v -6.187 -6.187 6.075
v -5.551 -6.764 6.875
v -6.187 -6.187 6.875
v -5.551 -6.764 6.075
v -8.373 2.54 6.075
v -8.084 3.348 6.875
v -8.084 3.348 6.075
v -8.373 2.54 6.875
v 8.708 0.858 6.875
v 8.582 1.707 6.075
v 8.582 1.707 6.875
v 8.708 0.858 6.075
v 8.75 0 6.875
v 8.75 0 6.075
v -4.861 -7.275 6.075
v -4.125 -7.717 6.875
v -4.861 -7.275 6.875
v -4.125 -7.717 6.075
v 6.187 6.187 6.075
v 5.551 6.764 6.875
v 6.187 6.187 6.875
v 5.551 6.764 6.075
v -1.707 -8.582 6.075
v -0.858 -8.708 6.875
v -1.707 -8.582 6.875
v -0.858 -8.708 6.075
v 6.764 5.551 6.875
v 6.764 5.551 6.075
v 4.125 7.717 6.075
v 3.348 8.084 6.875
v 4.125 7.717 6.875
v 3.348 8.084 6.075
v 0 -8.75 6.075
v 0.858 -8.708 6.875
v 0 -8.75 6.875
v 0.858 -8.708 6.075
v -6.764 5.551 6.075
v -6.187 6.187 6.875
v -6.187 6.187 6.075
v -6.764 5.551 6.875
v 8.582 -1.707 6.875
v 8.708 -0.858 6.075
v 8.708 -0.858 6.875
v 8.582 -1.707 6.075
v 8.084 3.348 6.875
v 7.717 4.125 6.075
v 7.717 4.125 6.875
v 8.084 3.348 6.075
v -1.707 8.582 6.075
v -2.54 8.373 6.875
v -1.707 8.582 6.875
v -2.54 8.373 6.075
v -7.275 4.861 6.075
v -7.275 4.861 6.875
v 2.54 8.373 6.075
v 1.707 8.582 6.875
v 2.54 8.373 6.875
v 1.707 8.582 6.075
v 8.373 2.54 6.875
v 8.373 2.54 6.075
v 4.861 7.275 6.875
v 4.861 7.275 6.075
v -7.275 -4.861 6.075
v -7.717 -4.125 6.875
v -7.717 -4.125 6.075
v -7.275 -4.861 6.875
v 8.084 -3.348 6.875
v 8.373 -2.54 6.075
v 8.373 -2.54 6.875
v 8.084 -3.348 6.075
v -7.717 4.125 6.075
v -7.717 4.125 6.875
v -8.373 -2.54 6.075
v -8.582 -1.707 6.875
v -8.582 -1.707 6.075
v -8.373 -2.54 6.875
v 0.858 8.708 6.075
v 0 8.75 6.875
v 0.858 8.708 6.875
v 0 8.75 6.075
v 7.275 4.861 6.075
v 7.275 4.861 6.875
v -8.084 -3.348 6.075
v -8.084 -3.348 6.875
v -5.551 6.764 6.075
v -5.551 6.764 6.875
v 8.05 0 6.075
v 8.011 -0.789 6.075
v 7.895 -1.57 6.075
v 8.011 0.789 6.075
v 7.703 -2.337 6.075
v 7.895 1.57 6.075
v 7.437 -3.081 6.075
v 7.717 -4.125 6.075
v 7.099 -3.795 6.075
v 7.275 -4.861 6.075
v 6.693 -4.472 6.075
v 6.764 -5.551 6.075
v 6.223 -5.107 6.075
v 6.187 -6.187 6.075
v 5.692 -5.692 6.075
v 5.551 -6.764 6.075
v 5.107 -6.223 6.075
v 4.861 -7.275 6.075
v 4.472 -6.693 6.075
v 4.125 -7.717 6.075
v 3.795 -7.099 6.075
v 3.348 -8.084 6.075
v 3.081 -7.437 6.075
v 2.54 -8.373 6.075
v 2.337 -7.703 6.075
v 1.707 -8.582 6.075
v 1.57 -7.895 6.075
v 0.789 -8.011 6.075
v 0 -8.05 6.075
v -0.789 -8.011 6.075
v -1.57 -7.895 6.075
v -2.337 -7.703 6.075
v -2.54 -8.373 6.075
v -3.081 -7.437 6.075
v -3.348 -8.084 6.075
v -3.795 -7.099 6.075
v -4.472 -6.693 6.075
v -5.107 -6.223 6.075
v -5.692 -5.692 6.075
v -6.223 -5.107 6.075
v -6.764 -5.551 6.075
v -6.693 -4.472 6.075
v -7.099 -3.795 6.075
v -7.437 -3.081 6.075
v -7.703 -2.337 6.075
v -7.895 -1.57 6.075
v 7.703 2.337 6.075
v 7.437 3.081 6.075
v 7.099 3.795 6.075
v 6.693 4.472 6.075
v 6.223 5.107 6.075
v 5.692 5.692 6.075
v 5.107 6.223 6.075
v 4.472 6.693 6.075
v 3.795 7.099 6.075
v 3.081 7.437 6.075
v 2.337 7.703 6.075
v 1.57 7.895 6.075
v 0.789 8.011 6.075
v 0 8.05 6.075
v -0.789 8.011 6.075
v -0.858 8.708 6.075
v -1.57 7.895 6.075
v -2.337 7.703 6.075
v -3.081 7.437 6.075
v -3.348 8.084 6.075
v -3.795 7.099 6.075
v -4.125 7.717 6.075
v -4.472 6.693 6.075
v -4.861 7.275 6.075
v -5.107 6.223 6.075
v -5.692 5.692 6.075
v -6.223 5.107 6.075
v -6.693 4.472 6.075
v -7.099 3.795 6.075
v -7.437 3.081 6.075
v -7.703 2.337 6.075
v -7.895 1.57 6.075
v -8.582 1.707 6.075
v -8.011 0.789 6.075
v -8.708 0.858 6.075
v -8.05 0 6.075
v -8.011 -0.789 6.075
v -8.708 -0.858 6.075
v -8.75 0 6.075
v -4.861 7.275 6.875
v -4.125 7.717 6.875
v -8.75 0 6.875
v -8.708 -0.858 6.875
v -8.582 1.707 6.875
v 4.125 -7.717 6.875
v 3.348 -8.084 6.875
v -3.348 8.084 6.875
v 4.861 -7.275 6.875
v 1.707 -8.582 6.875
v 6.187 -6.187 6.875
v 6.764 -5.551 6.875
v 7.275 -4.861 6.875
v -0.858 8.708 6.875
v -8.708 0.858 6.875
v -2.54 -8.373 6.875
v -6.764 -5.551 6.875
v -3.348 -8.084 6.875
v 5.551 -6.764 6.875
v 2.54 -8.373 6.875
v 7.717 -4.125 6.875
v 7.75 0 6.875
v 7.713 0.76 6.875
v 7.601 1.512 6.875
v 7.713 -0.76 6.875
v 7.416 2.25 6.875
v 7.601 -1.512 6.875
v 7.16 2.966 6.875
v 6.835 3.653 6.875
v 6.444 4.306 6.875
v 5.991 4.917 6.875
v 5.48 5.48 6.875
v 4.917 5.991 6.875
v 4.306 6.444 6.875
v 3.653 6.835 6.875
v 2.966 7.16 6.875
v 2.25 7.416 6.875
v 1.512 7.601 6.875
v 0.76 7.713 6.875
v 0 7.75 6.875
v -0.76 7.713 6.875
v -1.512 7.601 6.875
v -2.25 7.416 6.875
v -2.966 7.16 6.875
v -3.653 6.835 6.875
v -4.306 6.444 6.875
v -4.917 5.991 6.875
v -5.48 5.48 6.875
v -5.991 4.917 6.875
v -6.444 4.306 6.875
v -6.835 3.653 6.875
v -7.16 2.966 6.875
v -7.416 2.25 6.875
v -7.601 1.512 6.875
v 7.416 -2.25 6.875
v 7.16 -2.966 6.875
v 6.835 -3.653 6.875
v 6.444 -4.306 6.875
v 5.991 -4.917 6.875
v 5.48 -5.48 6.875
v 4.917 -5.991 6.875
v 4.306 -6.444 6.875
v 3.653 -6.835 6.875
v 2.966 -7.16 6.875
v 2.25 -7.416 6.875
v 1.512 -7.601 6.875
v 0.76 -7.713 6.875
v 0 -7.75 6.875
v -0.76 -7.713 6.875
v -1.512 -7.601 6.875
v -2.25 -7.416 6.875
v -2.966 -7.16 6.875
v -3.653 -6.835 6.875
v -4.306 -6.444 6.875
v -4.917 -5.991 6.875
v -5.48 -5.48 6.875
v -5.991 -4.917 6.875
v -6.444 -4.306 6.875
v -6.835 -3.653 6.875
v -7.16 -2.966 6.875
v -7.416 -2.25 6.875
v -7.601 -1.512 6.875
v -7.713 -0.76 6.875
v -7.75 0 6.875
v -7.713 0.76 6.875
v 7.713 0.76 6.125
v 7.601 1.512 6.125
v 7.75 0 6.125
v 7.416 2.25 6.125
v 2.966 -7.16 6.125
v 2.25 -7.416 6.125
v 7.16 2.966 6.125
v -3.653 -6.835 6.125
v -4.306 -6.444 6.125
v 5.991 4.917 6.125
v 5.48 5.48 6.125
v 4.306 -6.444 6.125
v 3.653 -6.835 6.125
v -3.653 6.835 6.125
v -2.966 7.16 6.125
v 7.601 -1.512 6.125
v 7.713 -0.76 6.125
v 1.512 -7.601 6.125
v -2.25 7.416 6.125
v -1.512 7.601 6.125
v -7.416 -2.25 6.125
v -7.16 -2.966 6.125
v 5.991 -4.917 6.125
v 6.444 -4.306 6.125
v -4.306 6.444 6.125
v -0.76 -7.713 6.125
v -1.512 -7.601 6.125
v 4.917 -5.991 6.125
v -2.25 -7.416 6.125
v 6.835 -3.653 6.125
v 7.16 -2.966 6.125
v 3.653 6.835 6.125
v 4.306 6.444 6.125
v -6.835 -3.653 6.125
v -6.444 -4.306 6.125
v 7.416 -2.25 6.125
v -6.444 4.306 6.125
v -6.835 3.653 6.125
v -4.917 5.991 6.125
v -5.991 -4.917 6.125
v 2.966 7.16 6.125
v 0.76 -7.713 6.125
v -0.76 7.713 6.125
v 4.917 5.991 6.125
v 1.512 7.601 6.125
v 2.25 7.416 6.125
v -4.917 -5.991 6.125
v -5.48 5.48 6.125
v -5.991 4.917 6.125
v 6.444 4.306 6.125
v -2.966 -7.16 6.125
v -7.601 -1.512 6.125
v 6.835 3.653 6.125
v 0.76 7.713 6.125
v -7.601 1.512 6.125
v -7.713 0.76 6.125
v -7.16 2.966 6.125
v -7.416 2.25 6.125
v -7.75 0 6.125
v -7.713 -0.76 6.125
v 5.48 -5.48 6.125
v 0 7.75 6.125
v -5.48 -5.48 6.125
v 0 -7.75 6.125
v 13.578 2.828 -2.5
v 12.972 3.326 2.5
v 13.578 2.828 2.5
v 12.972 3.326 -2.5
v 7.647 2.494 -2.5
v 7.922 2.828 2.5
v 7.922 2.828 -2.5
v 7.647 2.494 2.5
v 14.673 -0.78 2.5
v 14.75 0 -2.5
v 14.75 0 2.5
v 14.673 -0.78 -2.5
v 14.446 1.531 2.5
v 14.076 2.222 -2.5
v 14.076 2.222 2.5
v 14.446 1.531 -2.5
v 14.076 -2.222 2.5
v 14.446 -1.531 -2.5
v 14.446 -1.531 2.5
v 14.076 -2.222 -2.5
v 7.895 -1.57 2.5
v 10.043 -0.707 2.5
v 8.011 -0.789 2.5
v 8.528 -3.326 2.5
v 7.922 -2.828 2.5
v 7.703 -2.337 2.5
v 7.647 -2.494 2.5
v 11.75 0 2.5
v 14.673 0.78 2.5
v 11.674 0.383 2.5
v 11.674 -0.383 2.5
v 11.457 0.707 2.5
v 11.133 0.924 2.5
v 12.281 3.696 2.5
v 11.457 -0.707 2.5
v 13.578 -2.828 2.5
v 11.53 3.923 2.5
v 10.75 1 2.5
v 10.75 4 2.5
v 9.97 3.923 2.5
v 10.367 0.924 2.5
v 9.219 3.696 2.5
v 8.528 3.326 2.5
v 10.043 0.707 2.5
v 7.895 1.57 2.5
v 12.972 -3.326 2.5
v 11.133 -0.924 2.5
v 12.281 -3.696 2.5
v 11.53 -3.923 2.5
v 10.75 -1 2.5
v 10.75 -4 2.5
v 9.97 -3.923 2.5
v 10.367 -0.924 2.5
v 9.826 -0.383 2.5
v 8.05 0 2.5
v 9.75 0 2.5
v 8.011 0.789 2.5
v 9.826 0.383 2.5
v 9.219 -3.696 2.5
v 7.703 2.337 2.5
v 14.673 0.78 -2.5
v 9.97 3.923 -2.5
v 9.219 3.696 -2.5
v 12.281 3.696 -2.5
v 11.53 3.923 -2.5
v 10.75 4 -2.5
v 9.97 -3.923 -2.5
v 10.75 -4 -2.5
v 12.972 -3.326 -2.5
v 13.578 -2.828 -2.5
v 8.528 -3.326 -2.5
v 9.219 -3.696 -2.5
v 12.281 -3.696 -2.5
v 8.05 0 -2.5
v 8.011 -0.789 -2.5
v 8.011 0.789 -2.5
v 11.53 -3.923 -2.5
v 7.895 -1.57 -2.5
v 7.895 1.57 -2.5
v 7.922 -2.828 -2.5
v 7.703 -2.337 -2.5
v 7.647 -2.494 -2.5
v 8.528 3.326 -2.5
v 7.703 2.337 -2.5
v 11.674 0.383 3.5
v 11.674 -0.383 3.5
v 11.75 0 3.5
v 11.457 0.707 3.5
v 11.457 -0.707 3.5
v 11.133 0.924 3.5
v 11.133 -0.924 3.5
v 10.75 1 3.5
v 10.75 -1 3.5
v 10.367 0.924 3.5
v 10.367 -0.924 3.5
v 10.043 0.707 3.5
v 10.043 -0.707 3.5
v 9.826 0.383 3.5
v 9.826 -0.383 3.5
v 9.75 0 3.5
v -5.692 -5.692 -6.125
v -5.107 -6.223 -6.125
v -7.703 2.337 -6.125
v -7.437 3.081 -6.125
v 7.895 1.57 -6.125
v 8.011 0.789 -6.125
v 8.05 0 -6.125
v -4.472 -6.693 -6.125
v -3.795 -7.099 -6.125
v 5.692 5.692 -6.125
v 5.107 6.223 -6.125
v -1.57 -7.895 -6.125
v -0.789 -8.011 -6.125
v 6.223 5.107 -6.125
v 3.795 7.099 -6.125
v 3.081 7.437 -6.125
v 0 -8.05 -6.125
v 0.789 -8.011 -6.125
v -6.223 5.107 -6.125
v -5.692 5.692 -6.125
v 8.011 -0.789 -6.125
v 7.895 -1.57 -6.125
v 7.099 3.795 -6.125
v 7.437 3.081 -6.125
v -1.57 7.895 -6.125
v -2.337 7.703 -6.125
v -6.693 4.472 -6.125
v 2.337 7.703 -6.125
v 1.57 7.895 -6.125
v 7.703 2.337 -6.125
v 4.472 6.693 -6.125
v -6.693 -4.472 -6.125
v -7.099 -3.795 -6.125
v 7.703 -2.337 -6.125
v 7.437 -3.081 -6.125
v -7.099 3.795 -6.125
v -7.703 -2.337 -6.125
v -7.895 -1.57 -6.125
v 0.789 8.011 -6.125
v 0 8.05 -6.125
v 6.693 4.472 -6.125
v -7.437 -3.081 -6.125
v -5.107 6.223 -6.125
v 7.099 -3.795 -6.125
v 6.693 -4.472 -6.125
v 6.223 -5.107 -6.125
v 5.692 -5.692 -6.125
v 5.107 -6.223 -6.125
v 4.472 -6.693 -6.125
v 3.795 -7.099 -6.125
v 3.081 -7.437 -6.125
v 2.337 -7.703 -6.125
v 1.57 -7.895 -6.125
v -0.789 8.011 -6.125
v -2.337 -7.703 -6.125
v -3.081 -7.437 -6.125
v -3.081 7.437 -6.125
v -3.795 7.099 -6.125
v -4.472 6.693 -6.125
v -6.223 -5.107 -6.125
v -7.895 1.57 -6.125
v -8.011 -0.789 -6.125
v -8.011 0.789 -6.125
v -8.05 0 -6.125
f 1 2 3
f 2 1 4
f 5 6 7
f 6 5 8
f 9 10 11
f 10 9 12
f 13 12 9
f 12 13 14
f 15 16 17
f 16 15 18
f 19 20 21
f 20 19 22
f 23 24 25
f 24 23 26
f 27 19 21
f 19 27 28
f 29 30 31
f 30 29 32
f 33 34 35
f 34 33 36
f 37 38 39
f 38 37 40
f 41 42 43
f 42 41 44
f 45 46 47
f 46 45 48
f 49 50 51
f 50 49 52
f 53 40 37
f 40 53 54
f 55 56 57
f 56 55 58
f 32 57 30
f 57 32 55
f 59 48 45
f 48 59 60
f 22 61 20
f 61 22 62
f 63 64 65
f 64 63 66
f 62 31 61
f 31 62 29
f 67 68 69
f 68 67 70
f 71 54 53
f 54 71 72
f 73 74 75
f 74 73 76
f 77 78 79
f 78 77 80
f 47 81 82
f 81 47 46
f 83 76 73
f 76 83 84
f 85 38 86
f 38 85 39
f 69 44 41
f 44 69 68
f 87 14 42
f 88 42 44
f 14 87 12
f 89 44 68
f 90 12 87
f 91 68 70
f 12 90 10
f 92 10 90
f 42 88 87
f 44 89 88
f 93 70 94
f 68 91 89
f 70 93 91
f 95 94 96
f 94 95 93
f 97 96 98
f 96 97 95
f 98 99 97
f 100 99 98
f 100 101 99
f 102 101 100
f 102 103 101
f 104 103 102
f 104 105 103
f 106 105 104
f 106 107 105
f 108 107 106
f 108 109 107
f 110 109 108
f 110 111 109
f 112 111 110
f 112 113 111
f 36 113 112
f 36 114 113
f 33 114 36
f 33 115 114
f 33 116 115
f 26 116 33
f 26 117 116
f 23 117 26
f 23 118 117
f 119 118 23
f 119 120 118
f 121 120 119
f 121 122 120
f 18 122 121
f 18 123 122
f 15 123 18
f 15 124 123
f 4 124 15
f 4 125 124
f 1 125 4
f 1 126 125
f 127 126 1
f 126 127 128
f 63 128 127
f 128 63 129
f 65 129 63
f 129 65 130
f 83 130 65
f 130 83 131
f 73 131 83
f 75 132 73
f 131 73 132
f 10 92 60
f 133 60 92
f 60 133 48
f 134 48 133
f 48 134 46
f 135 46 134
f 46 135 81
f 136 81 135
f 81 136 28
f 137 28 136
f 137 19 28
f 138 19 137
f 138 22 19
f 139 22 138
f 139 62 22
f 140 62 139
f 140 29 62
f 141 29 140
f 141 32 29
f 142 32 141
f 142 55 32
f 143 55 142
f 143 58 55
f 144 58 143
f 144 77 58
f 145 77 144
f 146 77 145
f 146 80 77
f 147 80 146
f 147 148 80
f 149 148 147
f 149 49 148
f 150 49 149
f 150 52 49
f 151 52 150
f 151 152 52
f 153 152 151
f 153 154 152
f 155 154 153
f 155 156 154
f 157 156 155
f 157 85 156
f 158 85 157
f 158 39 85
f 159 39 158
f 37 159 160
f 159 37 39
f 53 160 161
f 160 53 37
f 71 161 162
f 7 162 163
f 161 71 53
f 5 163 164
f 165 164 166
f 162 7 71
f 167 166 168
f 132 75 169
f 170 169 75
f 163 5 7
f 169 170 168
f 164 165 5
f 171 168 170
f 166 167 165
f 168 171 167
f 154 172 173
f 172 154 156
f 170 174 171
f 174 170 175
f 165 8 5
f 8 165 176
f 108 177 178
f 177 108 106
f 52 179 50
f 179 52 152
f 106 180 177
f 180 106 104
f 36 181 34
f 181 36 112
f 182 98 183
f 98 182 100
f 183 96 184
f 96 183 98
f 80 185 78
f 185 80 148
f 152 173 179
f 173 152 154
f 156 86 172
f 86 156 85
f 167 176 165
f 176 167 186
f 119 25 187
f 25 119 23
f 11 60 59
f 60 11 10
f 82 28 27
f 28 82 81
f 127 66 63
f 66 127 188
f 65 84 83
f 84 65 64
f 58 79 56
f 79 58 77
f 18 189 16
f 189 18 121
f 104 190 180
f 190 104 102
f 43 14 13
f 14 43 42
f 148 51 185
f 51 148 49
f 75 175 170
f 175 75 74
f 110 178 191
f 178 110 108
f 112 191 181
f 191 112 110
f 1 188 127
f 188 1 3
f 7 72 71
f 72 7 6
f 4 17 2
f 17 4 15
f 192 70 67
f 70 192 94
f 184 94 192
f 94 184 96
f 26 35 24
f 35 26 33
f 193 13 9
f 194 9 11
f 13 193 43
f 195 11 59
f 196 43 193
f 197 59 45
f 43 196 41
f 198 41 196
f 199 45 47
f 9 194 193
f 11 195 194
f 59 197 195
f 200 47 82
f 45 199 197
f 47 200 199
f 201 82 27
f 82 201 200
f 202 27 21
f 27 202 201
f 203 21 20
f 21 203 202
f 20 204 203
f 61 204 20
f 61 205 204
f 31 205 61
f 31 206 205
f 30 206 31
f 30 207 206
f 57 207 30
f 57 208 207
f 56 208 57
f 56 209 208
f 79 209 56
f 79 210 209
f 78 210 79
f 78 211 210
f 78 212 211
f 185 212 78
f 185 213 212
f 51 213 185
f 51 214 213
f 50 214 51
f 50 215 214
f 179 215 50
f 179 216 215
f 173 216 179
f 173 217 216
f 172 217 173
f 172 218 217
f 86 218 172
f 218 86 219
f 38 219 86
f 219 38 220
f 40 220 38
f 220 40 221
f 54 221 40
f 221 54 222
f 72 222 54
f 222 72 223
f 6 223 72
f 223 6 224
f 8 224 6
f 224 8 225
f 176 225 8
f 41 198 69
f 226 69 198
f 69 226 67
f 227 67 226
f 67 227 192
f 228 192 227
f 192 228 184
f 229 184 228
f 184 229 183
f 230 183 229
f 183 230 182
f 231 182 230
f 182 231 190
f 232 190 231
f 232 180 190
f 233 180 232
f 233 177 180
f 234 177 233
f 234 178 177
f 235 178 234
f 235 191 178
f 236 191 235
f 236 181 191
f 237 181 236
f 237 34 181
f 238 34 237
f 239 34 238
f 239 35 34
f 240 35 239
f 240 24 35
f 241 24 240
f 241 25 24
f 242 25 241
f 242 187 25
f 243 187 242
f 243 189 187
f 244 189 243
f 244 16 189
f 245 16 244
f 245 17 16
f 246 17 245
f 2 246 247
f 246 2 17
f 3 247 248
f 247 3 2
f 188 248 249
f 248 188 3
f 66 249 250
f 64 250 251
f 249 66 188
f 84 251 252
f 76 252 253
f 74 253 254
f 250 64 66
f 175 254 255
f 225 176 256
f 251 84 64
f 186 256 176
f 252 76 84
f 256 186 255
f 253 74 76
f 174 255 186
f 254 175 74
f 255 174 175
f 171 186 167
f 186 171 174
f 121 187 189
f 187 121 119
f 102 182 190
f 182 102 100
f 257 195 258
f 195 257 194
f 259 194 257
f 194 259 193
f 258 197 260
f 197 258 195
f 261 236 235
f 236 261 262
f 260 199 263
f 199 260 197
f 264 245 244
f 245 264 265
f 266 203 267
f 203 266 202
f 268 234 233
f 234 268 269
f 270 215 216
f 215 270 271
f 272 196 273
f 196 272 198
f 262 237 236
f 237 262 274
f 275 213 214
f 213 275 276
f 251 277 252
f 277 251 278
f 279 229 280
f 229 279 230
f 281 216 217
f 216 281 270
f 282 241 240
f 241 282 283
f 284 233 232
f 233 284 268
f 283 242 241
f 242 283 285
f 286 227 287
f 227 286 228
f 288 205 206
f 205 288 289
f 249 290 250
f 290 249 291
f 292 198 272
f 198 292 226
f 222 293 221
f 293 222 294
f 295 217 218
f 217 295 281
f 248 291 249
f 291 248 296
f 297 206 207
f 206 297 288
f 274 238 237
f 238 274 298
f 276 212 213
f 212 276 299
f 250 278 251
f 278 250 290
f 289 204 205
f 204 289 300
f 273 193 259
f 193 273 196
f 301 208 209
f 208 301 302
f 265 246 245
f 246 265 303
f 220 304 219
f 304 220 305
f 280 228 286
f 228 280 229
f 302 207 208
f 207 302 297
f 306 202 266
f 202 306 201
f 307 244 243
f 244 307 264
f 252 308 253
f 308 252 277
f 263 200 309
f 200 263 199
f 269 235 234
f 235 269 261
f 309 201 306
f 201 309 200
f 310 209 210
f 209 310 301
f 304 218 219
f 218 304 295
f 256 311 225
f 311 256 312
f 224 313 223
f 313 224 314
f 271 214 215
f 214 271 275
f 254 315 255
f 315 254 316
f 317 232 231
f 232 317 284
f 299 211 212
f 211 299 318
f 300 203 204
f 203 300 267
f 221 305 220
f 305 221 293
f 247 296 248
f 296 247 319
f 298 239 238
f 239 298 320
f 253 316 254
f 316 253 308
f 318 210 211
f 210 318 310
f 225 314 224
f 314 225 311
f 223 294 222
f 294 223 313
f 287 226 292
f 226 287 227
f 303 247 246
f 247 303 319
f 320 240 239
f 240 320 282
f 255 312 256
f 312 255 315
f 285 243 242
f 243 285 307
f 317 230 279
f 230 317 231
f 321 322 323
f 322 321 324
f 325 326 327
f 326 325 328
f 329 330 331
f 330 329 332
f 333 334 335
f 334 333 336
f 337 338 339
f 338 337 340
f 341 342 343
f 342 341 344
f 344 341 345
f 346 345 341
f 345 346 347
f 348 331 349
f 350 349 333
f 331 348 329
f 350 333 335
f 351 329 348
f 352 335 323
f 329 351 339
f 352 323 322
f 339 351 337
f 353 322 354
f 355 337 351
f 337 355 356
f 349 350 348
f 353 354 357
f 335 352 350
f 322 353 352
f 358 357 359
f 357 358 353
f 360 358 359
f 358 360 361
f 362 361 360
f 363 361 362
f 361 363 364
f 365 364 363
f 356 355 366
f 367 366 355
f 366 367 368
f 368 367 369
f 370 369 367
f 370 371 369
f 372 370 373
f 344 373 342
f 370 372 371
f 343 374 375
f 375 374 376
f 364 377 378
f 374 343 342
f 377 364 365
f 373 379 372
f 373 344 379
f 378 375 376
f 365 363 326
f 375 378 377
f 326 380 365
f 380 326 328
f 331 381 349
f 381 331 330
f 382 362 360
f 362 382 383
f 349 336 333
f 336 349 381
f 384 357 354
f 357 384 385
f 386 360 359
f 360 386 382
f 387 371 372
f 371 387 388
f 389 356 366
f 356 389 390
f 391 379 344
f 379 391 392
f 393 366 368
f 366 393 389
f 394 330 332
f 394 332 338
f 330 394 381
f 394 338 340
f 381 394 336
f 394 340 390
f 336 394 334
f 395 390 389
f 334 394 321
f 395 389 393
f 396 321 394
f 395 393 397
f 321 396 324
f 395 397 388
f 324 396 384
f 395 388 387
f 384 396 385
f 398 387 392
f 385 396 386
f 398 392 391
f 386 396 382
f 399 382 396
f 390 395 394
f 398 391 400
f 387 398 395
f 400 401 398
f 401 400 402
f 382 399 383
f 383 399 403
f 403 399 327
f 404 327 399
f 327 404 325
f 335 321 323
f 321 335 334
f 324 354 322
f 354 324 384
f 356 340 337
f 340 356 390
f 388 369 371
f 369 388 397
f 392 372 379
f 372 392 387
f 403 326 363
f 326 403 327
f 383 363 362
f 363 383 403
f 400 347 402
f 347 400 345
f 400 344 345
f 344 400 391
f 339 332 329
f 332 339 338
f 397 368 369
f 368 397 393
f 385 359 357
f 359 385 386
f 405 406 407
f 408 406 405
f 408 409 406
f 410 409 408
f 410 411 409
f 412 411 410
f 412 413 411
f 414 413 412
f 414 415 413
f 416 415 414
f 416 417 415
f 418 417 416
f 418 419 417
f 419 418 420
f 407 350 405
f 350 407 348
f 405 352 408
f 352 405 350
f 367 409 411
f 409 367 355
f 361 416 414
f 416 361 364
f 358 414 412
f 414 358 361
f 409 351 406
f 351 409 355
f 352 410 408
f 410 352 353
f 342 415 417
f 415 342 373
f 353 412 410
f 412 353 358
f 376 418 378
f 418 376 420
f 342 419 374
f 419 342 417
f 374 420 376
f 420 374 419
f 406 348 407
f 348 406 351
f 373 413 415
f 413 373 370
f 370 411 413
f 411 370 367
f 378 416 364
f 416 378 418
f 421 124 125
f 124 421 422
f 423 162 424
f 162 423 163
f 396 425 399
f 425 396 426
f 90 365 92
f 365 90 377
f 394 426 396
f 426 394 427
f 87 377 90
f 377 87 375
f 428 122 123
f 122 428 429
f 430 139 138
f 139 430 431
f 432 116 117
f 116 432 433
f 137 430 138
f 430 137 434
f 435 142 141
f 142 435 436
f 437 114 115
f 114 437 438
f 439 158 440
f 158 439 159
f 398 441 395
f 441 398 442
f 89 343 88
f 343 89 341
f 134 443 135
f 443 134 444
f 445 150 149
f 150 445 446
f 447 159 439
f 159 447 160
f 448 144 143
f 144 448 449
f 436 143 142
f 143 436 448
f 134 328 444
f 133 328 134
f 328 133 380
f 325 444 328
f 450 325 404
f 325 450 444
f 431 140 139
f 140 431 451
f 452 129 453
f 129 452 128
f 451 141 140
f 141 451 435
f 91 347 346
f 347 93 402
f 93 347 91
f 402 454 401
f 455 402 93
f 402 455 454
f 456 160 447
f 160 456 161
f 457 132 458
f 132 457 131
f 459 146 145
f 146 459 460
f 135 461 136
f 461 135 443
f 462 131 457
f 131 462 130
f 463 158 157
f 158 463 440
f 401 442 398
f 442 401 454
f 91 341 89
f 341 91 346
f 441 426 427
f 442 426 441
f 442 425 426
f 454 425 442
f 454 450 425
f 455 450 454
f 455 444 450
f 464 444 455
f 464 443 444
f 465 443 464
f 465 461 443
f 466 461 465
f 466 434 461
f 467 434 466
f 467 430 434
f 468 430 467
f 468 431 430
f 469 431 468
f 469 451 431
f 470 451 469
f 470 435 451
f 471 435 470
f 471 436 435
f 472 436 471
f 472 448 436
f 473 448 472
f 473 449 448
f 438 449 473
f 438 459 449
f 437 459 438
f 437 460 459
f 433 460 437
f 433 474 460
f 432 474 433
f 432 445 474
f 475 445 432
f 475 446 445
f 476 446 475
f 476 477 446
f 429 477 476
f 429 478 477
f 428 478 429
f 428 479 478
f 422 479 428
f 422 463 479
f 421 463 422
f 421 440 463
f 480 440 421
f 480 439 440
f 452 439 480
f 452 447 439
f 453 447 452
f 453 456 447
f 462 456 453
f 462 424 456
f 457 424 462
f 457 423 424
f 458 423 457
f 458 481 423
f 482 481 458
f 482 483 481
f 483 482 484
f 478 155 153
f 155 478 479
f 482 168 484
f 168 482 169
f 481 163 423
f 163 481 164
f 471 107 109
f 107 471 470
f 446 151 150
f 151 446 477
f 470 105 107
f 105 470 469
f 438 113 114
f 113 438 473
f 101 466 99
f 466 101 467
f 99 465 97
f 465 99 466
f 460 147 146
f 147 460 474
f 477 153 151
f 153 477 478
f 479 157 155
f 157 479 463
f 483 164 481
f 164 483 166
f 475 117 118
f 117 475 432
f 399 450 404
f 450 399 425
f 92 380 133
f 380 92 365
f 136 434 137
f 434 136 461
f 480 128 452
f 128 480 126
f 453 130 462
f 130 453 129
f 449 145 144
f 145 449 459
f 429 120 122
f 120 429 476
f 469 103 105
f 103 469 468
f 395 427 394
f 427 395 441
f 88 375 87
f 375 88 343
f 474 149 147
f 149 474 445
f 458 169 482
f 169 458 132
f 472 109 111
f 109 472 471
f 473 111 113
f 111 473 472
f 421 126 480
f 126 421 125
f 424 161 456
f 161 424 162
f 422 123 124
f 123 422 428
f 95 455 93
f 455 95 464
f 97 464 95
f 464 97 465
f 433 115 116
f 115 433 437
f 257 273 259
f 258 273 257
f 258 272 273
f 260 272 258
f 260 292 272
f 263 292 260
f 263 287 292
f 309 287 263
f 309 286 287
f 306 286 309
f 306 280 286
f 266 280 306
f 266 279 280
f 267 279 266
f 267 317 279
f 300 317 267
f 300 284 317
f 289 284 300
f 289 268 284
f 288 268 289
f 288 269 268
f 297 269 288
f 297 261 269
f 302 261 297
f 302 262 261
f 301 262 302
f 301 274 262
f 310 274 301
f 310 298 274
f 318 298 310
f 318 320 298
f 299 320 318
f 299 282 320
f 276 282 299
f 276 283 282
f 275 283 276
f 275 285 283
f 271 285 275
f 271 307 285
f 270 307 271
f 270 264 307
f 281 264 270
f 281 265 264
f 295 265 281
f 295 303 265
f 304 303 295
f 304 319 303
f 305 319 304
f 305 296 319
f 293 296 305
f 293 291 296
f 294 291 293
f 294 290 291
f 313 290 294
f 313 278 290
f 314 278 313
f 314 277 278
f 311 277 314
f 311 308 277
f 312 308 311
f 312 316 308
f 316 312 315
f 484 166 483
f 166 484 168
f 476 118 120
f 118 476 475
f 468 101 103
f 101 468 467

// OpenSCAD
// Parameters
stator_diameter_mm = 14.0; //[7.0:28.0:0.25]
stator_height_mm = 11.75; //[5.875:23.5:0.25]
stator_center_bore_diameter_mm = 0.0; //[0.0:6.0:0.25]
rotor_can_wall_thickness_mm = 0.5; //[0.25:2.0:0.05]
rotor_can_clearance_mm = 0.25; //[0.1:1.0:0.05]
shaft_diameter_mm = 0.0; //[0.0:6.0:0.25]
shaft_length_mm = 0.0; //[0.0:30.0:0.5]
connect_overlap_mm = 1.0; //[0.5:2.0:0.1]
envelope_extra_radius_mm = 0.3; //[0.0:2.0:0.05]
envelope_extra_height_mm = 0.5; //[0.0:5.0:0.1]
mount_face_ring_radial_mm = 1.0; //[0.5:4.0:0.1]
mount_face_ring_thickness_mm = 0.8; //[0.4:3.0:0.1]
buzzer_diameter_mm = 8.0; //[4.0:16.0:0.5]
buzzer_height_mm = 5.0; //[2.5:12.0:0.5]
buzzer_pin_diameter_mm = 2.0; //[1.0:3.0:0.25]
buzzer_pin_height_mm = 2.0; //[0.5:6.0:0.25]

// Buzzer - complete geometry
module buzzer() {
  color([0.2, 0.2, 0.2]) {
    // Buzzer body
    translate([stator_diameter_mm/2 + rotor_can_clearance_mm + rotor_can_wall_thickness_mm + buzzer_diameter_mm/2 - connect_overlap_mm, 0, 0])
      cylinder(r=buzzer_diameter_mm/2, h=buzzer_height_mm, center=true, $fn=32);
    // Buzzer pin
    translate([stator_diameter_mm/2 + rotor_can_clearance_mm + rotor_can_wall_thickness_mm + buzzer_diameter_mm/2 - connect_overlap_mm, 0, buzzer_height_mm/2 + buzzer_pin_height_mm/2 - connect_overlap_mm])
      cylinder(r=buzzer_pin_diameter_mm/2, h=buzzer_pin_height_mm, center=true, $fn=16);
  }
}

// Assembly - combines all parts
module assembly() {
  // Stator cylinder
  color("DimGray") translate([0, 0, 0])
    cylinder(r=stator_diameter_mm/2, h=stator_height_mm, center=true, $fn=64);

  // Rotor can
  color("Black") difference() {
    translate([0, 0, 0])
      cylinder(r=stator_diameter_mm/2 + rotor_can_clearance_mm + rotor_can_wall_thickness_mm, h=stator_height_mm, center=true, $fn=64);
    translate([0, 0, 0])
      cylinder(r=stator_diameter_mm/2 + rotor_can_clearance_mm, h=stator_height_mm + 2*connect_overlap_mm, center=true, $fn=64);
  }

  // Motor envelope
  color([0.15, 0.15, 0.17]) translate([0, 0, 0])
    cylinder(r=stator_diameter_mm/2 + rotor_can_clearance_mm + rotor_can_wall_thickness_mm + envelope_extra_radius_mm, h=stator_height_mm + envelope_extra_height_mm, center=true, $fn=64);

  // Shaft stub
  if (shaft_diameter_mm > 0) {
    color("Silver") translate([0, 0, stator_height_mm/2 + max(shaft_length_mm, connect_overlap_mm)/2 - connect_overlap_mm])
      cylinder(r=max(shaft_diameter_mm, connect_overlap_mm)/2, h=max(shaft_length_mm, connect_overlap_mm), center=true, $fn=16);
  }

  // Mounting face reference
  color("Silver") difference() {
    translate([0, 0, stator_height_mm/2 - mount_face_ring_thickness_mm/2 + connect_overlap_mm])
      cylinder(r=stator_diameter_mm/2 + rotor_can_clearance_mm + rotor_can_wall_thickness_mm + mount_face_ring_radial_mm, h=mount_face_ring_thickness_mm, center=true, $fn=64);
    translate([0, 0, stator_height_mm/2 - mount_face_ring_thickness_mm/2 + connect_overlap_mm])
      cylinder(r=stator_diameter_mm/2 + rotor_can_clearance_mm + rotor_can_wall_thickness_mm, h=mount_face_ring_thickness_mm + 2*connect_overlap_mm, center=true, $fn=64);
  }

  // Buzzer
  buzzer();
}

// Final assembly call
assembly();
